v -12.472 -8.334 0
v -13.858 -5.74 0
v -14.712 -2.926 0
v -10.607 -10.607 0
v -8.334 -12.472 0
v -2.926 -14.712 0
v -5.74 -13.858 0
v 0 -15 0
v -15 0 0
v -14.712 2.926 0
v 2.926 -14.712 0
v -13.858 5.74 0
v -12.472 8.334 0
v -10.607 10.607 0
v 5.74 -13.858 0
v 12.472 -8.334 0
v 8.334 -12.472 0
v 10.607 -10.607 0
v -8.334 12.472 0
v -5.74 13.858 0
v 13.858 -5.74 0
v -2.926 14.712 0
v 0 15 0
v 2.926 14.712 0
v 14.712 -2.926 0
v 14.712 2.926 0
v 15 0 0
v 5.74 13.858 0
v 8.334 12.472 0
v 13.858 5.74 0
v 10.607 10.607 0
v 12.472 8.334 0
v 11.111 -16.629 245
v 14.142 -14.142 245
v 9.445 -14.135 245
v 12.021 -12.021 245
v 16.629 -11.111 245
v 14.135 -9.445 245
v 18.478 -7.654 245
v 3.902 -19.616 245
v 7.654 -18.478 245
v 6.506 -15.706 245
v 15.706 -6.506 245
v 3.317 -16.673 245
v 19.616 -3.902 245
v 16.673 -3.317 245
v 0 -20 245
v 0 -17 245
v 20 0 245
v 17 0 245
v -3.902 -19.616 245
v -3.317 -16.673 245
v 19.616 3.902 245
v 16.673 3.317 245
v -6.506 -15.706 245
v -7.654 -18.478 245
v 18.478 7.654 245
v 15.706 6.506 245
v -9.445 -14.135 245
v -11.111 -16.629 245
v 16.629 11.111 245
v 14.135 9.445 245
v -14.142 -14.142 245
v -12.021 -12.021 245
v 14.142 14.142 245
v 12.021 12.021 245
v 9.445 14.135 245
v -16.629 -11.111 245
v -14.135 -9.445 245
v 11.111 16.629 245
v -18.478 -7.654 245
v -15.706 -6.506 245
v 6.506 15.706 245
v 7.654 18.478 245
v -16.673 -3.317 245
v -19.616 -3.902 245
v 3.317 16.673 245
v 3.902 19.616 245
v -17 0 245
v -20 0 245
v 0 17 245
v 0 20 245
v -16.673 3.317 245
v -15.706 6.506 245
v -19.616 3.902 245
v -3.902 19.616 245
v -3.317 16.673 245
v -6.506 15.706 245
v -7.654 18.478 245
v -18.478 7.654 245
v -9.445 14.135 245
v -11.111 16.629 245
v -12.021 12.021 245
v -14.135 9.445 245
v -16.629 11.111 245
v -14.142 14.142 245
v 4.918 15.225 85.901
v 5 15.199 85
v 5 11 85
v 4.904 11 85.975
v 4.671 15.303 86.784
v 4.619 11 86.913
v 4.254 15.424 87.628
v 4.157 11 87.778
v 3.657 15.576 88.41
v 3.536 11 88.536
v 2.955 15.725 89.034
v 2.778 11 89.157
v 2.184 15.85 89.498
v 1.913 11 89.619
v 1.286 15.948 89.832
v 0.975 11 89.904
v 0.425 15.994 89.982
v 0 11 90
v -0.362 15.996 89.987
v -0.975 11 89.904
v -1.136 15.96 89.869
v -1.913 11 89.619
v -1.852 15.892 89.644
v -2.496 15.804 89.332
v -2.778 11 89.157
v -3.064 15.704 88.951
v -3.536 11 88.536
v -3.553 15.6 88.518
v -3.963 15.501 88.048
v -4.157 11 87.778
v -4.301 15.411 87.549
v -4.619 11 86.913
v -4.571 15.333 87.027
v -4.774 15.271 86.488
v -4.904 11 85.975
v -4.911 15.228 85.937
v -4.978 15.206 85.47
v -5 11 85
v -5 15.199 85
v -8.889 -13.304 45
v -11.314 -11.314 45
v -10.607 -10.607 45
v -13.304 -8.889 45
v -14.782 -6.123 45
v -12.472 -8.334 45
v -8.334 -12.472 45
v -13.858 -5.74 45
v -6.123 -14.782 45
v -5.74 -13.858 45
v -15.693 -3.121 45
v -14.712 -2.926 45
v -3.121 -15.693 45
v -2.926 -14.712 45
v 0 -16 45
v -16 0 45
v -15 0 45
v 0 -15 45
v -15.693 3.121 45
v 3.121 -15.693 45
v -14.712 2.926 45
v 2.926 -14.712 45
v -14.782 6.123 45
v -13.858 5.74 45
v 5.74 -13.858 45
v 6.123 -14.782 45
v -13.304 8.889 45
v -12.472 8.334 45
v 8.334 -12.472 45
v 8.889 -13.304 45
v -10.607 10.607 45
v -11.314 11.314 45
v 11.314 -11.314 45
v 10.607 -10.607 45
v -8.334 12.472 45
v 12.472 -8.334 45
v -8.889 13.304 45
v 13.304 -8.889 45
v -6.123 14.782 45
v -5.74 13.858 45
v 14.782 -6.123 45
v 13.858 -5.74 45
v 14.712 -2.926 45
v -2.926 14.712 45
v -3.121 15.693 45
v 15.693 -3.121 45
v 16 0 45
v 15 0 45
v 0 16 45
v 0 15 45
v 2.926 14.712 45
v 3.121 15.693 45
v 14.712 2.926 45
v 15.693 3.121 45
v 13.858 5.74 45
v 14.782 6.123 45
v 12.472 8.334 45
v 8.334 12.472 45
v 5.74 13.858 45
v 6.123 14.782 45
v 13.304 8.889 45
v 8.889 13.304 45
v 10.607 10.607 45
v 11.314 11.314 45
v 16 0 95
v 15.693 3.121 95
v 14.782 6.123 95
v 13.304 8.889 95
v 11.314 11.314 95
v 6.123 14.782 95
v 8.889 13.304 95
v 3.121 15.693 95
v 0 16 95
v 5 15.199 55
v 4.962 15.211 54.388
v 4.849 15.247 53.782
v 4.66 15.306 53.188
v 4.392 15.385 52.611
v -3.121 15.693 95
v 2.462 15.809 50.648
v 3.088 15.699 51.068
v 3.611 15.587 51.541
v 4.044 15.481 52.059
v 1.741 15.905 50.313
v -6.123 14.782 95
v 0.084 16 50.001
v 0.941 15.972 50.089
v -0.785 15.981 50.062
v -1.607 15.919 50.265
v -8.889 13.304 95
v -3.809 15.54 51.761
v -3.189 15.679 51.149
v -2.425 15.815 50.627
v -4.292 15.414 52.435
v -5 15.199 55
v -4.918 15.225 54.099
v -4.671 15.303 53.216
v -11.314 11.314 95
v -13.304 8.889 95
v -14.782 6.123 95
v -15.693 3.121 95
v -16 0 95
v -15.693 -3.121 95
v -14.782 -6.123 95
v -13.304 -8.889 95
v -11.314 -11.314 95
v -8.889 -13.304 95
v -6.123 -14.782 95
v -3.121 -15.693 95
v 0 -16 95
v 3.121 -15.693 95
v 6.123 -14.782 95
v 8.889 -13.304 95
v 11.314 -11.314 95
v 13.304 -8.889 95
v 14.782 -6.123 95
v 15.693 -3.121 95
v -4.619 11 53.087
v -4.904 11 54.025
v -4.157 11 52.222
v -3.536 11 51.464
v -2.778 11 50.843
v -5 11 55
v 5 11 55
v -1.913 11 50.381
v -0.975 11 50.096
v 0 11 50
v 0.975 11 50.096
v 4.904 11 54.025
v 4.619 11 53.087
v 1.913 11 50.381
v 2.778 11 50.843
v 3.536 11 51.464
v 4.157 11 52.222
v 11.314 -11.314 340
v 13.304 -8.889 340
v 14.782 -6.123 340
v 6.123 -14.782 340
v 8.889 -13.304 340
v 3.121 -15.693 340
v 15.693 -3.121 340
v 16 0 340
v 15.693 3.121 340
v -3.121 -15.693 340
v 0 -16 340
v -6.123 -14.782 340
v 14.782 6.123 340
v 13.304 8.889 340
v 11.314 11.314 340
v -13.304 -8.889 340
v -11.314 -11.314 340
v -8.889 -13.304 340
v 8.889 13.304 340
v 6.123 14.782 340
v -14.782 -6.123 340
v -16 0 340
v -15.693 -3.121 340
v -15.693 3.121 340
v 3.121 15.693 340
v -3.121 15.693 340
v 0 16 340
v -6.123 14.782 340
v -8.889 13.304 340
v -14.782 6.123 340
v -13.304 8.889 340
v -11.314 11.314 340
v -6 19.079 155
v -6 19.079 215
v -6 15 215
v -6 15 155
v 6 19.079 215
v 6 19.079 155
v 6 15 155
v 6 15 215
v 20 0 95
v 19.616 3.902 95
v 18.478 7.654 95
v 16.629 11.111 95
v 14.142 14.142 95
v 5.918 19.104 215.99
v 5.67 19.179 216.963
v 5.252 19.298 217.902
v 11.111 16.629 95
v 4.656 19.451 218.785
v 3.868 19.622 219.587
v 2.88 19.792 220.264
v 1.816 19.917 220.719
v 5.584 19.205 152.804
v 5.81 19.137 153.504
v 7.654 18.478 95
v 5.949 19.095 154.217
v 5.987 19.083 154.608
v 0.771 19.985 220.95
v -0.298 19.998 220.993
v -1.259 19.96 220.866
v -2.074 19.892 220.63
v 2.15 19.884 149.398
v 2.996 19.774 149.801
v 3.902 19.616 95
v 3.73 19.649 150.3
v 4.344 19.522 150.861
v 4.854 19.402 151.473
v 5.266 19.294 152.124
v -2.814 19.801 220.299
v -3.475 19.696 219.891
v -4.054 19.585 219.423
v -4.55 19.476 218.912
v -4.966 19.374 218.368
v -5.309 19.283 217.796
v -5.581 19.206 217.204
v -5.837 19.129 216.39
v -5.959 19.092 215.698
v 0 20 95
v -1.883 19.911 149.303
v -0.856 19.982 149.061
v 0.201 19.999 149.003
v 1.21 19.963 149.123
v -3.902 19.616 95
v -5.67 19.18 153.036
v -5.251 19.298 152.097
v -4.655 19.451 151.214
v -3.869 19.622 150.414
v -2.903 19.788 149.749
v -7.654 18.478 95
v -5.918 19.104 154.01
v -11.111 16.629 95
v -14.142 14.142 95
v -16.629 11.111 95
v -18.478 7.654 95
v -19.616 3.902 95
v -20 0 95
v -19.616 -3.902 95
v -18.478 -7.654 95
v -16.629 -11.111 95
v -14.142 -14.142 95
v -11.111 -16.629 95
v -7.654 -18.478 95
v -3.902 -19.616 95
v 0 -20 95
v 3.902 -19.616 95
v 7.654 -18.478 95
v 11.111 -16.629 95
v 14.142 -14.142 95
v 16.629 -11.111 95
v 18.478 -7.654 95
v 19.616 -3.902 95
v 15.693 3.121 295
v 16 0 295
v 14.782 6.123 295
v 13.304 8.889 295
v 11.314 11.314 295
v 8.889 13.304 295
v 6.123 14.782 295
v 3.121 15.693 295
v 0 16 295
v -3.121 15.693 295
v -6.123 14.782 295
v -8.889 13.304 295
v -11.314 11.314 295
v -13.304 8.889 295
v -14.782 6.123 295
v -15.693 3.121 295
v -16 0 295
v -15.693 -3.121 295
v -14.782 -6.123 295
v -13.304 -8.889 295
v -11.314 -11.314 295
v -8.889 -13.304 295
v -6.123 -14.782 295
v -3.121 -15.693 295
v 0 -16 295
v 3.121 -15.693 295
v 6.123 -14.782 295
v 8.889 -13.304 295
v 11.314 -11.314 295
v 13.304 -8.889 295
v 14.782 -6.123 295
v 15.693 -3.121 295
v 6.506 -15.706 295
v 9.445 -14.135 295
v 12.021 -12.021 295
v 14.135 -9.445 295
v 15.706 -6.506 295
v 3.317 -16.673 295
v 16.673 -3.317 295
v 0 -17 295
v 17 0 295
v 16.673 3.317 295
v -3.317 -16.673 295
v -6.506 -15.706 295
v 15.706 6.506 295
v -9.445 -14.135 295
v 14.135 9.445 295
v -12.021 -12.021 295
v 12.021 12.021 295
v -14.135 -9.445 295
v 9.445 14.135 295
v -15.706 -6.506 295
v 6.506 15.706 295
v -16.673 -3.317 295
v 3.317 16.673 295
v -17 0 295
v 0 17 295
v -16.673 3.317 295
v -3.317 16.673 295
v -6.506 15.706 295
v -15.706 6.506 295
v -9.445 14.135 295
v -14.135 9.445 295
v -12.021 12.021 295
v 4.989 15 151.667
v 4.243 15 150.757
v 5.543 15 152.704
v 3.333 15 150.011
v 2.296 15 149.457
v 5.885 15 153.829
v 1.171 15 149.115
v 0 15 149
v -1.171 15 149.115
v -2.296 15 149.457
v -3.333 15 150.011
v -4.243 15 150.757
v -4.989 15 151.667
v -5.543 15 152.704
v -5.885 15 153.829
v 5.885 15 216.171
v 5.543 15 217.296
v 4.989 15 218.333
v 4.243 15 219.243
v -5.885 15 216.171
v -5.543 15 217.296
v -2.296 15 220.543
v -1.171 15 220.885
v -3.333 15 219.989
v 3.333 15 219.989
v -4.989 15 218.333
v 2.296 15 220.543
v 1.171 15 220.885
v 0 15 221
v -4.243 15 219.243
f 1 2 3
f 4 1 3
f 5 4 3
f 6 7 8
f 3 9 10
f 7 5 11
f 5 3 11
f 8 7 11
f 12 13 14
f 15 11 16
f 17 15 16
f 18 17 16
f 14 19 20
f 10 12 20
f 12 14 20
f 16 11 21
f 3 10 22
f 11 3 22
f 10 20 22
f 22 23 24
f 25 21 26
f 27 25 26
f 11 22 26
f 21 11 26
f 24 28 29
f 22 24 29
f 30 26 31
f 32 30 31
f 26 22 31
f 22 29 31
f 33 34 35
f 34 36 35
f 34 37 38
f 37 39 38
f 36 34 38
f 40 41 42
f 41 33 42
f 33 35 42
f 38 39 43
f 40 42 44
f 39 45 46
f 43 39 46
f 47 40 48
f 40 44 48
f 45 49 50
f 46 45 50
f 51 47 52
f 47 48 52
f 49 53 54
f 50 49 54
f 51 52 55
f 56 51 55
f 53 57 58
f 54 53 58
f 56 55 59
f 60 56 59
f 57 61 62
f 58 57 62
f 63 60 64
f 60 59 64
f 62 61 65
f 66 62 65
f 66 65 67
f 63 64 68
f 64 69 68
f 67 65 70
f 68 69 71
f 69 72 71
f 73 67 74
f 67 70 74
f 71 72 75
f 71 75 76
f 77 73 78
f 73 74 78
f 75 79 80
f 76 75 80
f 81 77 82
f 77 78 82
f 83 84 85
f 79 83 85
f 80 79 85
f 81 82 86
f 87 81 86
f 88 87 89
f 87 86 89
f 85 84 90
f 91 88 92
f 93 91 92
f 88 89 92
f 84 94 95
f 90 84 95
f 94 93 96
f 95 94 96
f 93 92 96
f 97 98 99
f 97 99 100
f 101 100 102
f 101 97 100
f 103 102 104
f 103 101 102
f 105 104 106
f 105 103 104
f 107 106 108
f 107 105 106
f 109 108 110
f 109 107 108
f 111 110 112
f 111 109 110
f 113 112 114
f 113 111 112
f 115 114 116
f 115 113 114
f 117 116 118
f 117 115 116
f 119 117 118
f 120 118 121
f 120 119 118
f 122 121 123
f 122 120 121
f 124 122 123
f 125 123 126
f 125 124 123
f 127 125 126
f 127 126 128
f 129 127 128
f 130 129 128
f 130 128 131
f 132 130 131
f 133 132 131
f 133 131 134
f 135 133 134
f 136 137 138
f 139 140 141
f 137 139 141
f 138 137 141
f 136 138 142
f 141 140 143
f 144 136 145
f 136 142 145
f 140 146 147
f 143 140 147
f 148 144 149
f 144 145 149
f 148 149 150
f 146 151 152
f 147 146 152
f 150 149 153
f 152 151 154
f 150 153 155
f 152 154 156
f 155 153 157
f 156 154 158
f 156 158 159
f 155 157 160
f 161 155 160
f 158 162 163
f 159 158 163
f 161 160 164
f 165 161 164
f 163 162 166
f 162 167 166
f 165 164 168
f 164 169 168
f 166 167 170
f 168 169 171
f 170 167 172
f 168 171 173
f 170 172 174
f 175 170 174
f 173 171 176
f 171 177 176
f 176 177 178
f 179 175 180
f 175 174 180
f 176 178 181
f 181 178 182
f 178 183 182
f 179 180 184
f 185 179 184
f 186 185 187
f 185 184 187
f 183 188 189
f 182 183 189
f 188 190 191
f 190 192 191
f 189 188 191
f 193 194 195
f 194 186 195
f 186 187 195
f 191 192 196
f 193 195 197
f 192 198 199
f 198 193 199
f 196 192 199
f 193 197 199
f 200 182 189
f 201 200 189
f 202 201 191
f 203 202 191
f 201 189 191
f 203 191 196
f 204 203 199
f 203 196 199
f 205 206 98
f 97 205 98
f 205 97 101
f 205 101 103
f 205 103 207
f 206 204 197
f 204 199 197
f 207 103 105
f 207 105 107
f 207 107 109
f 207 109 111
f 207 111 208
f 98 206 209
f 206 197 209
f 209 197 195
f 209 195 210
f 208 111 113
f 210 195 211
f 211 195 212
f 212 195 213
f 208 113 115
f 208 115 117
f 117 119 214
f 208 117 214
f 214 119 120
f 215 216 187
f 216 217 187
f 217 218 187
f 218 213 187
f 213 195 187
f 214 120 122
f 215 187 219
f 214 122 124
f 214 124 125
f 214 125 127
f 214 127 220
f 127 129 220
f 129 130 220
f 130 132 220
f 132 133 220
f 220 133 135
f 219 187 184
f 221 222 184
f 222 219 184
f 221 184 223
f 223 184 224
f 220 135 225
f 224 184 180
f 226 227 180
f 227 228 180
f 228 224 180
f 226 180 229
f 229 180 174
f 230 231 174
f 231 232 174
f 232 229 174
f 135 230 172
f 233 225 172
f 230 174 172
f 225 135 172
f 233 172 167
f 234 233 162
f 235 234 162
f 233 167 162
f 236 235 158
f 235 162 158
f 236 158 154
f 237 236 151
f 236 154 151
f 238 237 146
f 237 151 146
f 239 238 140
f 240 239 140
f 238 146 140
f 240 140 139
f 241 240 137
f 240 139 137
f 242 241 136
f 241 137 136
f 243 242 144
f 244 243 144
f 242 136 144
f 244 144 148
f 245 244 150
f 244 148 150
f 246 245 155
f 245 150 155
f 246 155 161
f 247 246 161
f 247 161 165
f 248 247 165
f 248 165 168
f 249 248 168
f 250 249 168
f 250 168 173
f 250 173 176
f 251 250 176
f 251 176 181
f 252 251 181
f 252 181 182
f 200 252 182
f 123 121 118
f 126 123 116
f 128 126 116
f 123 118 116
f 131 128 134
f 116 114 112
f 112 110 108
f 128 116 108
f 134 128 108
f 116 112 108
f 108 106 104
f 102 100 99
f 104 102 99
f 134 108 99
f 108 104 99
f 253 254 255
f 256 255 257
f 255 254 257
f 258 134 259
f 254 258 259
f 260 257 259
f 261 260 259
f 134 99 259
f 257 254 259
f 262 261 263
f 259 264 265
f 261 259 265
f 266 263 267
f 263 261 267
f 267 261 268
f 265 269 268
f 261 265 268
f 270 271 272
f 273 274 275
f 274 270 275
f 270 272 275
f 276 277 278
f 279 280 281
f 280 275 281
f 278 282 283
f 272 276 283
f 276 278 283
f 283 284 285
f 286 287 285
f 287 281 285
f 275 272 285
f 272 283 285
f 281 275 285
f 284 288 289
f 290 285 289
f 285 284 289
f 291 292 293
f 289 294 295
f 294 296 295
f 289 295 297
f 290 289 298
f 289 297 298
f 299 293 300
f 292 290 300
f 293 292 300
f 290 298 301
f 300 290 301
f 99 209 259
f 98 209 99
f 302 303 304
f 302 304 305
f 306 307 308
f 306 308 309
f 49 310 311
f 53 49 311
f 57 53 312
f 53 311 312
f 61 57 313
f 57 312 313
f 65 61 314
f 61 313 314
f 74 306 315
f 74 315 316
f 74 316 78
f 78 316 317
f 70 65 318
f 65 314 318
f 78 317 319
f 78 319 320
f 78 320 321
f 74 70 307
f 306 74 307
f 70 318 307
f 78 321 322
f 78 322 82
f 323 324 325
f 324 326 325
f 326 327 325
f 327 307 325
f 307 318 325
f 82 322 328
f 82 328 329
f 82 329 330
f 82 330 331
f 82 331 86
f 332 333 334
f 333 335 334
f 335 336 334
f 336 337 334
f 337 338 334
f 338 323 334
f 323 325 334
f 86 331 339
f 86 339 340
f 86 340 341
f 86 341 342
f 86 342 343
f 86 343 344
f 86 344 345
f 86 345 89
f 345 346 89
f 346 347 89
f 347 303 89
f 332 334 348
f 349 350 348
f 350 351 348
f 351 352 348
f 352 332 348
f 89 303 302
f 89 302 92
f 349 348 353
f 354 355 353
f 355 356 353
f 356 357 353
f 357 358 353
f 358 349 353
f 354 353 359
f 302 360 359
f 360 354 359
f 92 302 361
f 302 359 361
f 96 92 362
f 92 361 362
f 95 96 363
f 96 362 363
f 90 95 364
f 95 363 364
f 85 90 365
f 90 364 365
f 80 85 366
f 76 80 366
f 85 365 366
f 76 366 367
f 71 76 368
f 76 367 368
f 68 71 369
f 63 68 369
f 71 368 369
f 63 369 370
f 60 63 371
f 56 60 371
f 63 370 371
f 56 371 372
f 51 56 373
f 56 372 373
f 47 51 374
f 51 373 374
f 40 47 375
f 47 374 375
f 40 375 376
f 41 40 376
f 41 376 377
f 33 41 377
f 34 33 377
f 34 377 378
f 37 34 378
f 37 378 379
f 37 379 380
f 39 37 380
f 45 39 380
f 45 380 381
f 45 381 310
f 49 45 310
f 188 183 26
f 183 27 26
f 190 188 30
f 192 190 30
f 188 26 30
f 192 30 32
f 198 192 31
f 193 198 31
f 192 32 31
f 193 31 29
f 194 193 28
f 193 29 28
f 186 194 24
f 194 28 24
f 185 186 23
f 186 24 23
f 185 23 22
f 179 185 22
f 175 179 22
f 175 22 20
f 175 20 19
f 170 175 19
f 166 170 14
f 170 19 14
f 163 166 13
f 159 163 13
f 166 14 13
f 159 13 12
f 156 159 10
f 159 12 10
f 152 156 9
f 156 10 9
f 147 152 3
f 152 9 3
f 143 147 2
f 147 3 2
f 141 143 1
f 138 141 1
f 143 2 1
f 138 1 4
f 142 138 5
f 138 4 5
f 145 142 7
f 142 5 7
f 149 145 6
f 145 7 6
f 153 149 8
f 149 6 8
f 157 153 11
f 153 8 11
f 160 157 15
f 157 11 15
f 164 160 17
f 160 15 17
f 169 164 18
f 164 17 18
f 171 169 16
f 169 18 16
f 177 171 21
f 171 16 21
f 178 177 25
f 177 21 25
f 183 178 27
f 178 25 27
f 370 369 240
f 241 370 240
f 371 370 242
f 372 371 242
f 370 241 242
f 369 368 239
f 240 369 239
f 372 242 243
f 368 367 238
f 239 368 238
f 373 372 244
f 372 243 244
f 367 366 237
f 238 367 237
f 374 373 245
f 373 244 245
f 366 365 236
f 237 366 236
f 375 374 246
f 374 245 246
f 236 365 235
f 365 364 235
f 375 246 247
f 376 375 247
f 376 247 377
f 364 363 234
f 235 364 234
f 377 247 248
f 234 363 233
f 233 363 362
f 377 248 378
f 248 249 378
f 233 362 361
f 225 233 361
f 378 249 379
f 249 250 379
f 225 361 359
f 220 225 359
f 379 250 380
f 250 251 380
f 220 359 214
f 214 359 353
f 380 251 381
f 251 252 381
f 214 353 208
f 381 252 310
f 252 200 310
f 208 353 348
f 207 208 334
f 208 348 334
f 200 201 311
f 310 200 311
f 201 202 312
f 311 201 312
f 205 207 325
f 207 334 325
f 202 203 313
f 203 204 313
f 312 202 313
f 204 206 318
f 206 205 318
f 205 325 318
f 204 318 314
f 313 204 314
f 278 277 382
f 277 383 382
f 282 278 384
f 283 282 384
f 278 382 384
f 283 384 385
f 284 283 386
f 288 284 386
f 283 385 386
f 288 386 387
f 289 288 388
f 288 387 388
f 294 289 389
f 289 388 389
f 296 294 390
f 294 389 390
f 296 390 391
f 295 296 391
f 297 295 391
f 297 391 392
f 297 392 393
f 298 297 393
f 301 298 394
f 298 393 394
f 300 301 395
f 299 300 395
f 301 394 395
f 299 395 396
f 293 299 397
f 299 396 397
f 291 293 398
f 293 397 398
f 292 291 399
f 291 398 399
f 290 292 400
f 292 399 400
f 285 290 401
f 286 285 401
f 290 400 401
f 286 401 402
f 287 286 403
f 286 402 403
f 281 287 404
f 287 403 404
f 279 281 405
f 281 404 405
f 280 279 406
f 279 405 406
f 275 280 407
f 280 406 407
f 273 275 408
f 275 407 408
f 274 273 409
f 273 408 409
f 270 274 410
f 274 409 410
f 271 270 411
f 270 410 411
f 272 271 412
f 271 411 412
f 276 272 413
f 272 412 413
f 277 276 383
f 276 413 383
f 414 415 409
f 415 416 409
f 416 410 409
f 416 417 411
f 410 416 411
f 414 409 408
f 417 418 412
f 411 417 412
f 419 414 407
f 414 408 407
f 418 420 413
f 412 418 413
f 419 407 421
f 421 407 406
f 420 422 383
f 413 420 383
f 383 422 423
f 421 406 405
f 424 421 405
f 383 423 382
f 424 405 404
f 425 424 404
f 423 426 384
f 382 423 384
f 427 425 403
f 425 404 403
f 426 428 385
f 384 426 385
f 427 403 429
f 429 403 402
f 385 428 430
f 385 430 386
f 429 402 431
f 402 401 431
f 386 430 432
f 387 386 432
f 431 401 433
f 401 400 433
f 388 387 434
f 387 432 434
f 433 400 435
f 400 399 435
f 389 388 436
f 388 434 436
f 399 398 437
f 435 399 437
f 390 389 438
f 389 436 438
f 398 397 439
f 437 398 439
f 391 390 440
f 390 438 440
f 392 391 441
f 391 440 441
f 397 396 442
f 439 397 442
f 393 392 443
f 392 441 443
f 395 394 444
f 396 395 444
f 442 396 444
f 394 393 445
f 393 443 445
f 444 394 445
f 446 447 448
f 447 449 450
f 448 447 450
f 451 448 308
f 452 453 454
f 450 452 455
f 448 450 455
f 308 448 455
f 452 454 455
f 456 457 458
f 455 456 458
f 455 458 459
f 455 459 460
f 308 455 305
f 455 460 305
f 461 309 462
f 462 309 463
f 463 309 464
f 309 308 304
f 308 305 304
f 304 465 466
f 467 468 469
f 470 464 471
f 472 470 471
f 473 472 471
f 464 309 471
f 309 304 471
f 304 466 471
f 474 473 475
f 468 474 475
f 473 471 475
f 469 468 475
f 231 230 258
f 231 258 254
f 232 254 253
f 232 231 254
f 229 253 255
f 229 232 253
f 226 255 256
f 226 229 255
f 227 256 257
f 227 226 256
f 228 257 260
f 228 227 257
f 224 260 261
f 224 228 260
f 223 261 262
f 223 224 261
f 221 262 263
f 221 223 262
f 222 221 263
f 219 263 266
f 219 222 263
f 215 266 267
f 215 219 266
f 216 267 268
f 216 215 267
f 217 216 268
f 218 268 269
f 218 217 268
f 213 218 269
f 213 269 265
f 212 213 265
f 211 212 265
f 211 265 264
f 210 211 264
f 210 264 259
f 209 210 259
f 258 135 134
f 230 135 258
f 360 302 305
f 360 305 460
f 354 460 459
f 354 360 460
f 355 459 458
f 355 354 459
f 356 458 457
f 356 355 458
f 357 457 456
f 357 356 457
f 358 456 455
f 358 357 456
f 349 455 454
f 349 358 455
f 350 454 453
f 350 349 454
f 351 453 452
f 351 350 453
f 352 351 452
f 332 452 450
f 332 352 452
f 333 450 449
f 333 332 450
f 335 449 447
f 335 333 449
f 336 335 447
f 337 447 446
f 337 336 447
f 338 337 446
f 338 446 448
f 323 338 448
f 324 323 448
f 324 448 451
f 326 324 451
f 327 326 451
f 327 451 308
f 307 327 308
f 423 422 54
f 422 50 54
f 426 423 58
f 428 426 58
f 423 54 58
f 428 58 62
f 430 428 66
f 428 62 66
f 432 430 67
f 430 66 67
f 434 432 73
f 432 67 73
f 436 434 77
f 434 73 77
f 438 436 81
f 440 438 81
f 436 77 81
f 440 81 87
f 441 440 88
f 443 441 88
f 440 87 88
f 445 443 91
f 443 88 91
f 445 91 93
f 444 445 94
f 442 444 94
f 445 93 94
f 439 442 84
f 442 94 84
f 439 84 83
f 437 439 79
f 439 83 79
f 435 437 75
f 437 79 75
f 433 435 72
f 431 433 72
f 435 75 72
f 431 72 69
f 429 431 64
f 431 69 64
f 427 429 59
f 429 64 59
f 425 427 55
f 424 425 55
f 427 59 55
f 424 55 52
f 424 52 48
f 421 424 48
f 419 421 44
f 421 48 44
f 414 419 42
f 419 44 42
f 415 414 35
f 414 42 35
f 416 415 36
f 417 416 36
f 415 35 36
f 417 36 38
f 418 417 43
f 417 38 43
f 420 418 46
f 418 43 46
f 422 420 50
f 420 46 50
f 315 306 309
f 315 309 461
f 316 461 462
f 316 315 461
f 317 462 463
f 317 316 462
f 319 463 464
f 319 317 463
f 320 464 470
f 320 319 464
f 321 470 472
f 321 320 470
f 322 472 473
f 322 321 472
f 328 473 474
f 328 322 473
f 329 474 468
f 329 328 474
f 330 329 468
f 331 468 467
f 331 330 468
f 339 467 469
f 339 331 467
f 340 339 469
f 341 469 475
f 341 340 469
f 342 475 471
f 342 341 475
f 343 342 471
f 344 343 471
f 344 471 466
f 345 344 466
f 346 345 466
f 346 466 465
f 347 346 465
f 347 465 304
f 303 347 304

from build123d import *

# Parameters (mm, degrees)
CUT_EXTRUDE1_DEPTH  = 5
CUT_EXTRUDE11_DEPTH = 5


with BuildPart() as part:
    # Sketch1 → Revolve1 (revolve)
    with BuildSketch(Plane(origin=(0, 0, 0), x_dir=(1, 0, 0), z_dir=(0, 1, 0))):
        Polygon((0, 0), (0, -265), (0, -340), (16, -340), (16, -295), (17, -295), (17, -245), (20, -245), (20, -95), (16, -95), (16, -45), (15, -45), (15, 0), align=None)
    revolve(axis=Axis((0, 0, 0), (0, 0, 1)))

    # Sketch3 → Cut-Extrude1 (cut)
    with BuildSketch(Plane(origin=(2.233419524, 16, 45), x_dir=(0, 0, -1), z_dir=(0, -1, 0))):
        with BuildLine():
            Line((-10, 2.766580476), (-40, 2.766580476))
            ThreePointArc((-40, 2.766580476), (-45, -2.233419524), (-40, -7.233419524))
            Line((-40, -7.233419524), (-10, -7.233419524))
            ThreePointArc((-10, -7.233419524), (-5, -2.233419524), (-10, 2.766580476))
        make_face()
    extrude(amount=CUT_EXTRUDE1_DEPTH, mode=Mode.SUBTRACT)

    # Sketch31 → Cut-Extrude11 (cut)
    with BuildSketch(Plane(origin=(1.137793825, 20, 245), x_dir=(0, 0, 1), z_dir=(0, -1, 0))):
        with BuildLine():
            Line((-30, 7.137793825), (-90, 7.137793825))
            ThreePointArc((-90, 7.137793825), (-96, 1.137793825), (-90, -4.862206175))
            Line((-90, -4.862206175), (-30, -4.862206175))
            ThreePointArc((-30, -4.862206175), (-24, 1.137793825), (-30, 7.137793825))
        make_face()
    extrude(amount=CUT_EXTRUDE11_DEPTH, mode=Mode.SUBTRACT)


solid = part.part
